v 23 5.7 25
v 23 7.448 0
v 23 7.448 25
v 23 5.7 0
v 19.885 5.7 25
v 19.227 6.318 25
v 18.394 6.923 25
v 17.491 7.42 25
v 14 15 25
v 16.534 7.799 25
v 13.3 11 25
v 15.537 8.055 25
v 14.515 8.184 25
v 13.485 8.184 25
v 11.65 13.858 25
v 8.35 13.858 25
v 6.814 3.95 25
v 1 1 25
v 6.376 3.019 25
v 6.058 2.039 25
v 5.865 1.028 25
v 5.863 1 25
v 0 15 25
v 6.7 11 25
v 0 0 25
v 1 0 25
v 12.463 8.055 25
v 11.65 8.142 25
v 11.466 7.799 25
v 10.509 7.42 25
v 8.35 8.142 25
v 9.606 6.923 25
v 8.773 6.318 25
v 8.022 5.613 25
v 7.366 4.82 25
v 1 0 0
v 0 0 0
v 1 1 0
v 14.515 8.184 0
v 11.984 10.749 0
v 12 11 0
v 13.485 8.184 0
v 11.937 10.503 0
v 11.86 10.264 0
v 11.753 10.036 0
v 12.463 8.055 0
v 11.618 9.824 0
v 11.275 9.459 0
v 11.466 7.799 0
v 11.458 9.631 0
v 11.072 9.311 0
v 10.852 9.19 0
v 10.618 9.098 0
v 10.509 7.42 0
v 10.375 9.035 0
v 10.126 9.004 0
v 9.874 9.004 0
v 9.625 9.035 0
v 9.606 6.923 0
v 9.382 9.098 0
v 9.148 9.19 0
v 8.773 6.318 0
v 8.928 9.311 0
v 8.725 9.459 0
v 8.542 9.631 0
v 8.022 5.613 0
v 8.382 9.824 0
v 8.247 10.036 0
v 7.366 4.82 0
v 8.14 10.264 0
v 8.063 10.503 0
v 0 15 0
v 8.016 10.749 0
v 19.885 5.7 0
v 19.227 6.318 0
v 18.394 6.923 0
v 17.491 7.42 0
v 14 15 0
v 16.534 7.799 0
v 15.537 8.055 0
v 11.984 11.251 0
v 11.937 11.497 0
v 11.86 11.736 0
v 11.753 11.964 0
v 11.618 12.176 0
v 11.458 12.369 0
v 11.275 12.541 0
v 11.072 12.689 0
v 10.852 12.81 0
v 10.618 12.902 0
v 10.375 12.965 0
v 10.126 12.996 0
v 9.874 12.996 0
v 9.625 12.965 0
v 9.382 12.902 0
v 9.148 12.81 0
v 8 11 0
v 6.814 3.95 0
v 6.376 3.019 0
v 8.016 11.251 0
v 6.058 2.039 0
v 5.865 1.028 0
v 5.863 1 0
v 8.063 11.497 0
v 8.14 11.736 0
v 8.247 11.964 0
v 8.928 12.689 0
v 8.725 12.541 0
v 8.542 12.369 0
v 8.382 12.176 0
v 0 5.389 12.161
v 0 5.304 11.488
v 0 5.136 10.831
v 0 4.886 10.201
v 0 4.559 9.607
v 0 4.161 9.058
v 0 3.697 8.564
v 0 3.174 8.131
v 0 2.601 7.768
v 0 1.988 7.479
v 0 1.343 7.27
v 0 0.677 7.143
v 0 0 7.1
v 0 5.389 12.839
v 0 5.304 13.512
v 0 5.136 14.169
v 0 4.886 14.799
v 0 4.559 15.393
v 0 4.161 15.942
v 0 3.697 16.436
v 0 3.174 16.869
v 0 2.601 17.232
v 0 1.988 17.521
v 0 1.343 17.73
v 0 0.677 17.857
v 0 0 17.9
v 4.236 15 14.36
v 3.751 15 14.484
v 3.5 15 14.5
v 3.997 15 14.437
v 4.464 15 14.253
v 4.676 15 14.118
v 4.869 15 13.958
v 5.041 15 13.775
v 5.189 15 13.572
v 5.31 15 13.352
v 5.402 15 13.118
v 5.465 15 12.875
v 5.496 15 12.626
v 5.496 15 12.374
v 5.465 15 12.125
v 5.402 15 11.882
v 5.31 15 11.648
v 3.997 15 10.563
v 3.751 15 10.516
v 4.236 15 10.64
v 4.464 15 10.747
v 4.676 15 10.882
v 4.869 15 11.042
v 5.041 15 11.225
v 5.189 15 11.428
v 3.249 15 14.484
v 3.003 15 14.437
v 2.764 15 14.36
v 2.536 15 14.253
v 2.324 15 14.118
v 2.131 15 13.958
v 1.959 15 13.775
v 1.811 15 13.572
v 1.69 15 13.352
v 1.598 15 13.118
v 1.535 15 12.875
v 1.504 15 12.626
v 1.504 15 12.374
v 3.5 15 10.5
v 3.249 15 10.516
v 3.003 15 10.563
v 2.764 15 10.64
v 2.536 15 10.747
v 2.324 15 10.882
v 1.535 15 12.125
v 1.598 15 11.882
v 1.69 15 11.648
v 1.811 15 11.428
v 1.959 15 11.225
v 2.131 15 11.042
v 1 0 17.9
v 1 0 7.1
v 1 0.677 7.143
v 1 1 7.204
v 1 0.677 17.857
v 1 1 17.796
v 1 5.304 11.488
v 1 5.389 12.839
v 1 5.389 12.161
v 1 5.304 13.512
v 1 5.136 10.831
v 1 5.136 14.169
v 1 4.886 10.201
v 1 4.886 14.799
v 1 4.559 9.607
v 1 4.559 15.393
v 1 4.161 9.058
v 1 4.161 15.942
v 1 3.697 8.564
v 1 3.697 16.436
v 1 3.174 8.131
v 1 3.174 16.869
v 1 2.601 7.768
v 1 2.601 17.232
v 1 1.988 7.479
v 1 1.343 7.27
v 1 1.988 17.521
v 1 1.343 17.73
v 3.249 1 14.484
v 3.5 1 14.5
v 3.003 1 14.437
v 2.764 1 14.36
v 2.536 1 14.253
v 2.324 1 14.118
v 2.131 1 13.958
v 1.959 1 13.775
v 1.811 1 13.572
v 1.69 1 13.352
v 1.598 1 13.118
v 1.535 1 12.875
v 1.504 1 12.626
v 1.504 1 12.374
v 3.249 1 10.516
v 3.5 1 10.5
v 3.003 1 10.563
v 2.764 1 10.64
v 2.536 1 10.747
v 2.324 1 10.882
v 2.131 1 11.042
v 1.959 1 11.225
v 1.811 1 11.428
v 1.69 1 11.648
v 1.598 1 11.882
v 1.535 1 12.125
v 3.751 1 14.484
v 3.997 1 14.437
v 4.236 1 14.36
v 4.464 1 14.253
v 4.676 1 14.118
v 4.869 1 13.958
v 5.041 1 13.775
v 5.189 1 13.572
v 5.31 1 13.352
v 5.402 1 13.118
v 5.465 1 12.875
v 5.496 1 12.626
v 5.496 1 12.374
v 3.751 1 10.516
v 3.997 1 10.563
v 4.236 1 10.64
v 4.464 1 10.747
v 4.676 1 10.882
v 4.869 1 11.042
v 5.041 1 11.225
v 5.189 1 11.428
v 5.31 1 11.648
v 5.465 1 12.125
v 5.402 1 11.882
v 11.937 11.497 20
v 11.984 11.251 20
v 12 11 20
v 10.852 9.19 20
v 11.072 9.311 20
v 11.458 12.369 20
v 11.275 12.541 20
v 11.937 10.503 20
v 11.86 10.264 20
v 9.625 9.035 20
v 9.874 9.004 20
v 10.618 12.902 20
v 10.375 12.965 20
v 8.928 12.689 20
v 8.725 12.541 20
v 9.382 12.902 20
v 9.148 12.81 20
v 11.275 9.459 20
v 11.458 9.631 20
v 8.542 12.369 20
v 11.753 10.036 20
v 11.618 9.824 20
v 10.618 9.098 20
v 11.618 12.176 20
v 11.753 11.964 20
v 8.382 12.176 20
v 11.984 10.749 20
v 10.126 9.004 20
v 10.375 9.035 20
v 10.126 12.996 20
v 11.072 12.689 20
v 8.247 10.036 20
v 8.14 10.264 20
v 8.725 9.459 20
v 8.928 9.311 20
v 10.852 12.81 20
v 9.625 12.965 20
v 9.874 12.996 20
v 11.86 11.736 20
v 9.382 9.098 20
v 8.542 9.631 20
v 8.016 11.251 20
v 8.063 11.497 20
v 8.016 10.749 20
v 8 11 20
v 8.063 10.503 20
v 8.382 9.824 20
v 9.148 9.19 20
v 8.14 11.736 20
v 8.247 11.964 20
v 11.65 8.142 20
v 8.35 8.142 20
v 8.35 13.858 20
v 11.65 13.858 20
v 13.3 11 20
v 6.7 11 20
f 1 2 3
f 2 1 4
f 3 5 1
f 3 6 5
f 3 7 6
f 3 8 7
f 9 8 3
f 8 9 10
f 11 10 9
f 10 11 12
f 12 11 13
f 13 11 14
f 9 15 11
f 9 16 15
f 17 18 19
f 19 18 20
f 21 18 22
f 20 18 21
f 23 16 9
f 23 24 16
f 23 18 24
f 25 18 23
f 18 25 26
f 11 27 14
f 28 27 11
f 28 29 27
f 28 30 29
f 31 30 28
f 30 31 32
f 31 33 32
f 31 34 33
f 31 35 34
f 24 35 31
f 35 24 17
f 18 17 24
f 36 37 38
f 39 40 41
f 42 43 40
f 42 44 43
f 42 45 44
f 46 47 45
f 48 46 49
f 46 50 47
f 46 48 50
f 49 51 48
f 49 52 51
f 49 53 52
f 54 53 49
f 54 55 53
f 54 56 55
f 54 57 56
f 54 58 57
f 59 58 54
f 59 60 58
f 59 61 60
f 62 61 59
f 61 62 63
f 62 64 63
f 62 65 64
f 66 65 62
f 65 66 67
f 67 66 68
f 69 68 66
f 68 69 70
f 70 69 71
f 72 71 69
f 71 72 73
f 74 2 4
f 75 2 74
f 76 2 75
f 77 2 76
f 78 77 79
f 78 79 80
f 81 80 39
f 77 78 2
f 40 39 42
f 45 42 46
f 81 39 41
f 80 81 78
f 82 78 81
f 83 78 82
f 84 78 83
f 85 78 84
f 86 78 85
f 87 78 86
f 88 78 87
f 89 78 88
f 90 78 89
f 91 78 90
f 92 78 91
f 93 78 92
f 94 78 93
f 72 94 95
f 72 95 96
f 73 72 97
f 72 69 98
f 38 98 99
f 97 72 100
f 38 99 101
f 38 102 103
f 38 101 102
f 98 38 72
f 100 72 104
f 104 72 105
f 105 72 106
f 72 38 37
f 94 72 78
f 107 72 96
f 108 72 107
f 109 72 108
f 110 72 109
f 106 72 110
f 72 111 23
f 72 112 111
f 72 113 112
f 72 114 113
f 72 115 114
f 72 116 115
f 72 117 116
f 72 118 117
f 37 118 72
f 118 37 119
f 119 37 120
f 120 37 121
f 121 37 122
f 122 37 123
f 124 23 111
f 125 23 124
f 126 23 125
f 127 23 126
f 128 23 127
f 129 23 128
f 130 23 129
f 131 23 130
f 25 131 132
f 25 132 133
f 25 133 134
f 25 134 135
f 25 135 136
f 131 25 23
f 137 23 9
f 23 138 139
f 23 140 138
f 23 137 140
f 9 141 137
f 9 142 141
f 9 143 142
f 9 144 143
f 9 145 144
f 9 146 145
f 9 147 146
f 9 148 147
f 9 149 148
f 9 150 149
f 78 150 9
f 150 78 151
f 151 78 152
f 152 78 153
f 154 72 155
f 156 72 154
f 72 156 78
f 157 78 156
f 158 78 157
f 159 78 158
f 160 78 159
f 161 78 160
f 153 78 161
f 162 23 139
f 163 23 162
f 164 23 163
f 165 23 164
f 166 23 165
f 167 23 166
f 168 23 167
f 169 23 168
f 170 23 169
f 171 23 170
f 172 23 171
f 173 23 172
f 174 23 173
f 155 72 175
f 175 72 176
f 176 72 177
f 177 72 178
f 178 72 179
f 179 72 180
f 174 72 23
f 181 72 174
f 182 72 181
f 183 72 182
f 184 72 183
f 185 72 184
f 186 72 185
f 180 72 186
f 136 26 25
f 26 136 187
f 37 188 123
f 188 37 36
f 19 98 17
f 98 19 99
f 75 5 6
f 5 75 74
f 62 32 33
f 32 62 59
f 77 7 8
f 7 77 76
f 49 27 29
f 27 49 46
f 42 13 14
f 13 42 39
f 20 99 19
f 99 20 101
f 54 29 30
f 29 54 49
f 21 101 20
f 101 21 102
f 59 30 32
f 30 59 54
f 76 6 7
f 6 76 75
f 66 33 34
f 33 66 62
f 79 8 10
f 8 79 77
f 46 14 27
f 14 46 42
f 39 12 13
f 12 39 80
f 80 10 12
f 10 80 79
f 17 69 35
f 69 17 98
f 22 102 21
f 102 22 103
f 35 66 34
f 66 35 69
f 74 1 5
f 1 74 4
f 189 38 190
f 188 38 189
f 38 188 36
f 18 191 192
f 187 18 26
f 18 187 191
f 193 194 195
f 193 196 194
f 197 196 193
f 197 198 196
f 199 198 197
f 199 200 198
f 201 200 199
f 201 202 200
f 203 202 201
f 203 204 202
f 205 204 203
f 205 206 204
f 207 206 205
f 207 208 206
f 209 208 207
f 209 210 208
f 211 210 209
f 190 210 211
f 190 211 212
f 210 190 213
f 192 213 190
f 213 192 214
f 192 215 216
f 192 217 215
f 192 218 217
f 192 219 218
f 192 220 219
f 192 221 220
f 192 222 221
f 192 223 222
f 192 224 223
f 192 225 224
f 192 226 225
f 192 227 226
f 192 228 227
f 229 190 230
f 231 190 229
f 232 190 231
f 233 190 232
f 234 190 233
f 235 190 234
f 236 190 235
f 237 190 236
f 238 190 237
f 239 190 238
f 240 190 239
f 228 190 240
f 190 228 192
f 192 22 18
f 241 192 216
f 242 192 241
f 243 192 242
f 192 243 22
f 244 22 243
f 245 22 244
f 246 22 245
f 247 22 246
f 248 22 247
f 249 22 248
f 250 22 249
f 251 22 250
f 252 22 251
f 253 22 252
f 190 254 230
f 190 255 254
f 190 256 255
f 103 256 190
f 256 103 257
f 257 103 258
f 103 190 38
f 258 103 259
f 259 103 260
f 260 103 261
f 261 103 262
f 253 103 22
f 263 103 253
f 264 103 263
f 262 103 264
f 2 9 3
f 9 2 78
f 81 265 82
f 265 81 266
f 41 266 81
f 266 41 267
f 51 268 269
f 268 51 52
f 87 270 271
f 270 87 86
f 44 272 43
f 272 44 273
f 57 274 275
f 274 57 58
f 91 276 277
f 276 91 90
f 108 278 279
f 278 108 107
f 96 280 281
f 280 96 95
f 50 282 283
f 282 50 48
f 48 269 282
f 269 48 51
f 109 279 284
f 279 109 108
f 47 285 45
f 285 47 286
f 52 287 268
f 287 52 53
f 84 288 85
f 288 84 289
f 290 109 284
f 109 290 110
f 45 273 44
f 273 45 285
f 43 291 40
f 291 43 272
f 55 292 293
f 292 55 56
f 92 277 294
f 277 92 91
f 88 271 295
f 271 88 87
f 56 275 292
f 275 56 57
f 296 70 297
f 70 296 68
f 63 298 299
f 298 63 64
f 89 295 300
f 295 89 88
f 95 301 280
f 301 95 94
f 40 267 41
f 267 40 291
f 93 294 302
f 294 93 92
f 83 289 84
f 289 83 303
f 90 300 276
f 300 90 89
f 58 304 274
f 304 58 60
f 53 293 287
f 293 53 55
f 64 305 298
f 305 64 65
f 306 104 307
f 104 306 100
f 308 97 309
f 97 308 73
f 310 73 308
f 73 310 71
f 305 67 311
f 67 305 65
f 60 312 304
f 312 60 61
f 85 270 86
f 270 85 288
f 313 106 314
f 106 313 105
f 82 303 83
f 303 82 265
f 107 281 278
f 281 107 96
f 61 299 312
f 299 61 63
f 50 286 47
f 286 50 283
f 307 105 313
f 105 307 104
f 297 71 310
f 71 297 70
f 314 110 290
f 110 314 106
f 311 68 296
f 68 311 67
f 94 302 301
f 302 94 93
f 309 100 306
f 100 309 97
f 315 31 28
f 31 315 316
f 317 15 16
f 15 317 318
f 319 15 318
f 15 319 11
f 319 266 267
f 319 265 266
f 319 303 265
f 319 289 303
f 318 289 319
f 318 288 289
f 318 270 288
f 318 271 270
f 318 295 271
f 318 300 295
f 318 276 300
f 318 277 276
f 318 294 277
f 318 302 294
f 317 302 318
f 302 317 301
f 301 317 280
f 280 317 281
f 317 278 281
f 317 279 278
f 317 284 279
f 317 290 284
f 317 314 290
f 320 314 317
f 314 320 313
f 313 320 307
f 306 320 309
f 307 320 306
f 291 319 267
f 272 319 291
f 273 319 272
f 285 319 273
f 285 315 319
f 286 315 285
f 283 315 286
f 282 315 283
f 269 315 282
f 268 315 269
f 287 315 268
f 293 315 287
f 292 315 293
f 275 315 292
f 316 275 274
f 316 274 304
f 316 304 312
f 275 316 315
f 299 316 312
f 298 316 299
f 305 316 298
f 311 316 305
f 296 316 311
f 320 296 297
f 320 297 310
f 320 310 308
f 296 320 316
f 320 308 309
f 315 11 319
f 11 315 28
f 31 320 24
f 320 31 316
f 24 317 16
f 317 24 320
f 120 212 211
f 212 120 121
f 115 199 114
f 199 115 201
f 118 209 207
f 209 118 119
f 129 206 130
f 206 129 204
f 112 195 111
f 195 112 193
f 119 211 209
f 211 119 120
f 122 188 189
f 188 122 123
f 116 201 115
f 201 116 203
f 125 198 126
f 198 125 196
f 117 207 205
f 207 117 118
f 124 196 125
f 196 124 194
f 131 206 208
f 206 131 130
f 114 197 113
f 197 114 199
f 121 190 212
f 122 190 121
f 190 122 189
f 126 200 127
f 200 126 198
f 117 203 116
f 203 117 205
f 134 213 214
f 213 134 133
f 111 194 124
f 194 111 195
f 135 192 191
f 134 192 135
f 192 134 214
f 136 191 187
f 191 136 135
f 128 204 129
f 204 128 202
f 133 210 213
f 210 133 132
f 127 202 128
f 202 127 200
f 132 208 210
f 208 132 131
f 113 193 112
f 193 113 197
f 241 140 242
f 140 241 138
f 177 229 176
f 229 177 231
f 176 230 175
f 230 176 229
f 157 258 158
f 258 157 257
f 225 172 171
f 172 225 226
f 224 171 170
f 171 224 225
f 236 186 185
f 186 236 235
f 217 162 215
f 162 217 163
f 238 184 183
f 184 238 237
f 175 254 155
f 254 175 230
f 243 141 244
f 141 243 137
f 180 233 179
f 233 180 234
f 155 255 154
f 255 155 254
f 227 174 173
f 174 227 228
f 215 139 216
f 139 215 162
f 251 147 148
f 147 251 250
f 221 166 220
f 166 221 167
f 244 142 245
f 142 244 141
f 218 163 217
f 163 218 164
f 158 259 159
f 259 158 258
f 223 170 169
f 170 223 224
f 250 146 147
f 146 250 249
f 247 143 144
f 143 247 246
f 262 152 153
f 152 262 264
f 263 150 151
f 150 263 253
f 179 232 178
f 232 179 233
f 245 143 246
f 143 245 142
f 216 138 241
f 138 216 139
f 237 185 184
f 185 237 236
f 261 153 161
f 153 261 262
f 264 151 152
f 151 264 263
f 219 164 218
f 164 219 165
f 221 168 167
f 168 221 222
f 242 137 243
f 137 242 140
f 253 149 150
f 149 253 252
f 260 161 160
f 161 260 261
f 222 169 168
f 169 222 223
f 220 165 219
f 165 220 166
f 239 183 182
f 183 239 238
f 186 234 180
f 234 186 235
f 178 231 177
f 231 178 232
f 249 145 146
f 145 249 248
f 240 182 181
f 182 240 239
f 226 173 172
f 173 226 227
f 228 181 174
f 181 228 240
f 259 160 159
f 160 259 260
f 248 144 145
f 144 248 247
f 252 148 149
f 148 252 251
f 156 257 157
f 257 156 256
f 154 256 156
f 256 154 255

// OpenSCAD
r_douille=8.2;
r_m3=2;
r_ecrou_m3=3.3;
r_arbre=4.4;
height=25;

module presse_douille(){
	difference(){
		cube([23,15,height]);
		
		//passage douille
		translate([14,0,-5]){cylinder(r=r_douille, h=height+10, $fn=50);}

		//extrusions principales
		translate([14,-2,-5]){cube([15,7.7,height+10]);}
		translate([1,-2,-5]){cube([15,3,height+10]);}
		translate([14,15,-5]){rotate([0,0,-40])cube([15,15,height+10]);}

		//trou pour réglage endstop Z
		translate([10,11,-5]){cylinder(r=r_m3, h=height+10, $fn=50);}
		translate([10,11,height-5]){cylinder(r=r_ecrou_m3, h=height, $fn=6);}

		//extrusion pour passage de fin de l'arbre
		translate([-height,0,height/2]){rotate([0,90,0])cylinder(r=r_arbre+1, h=height+1, $fn=50);}

		//trou latéral pour vissage
		translate([3.5,0,height/2]){rotate([0,90,90])cylinder(r=r_m3, h=height, $fn=50);}

	}
}
presse_douille();
